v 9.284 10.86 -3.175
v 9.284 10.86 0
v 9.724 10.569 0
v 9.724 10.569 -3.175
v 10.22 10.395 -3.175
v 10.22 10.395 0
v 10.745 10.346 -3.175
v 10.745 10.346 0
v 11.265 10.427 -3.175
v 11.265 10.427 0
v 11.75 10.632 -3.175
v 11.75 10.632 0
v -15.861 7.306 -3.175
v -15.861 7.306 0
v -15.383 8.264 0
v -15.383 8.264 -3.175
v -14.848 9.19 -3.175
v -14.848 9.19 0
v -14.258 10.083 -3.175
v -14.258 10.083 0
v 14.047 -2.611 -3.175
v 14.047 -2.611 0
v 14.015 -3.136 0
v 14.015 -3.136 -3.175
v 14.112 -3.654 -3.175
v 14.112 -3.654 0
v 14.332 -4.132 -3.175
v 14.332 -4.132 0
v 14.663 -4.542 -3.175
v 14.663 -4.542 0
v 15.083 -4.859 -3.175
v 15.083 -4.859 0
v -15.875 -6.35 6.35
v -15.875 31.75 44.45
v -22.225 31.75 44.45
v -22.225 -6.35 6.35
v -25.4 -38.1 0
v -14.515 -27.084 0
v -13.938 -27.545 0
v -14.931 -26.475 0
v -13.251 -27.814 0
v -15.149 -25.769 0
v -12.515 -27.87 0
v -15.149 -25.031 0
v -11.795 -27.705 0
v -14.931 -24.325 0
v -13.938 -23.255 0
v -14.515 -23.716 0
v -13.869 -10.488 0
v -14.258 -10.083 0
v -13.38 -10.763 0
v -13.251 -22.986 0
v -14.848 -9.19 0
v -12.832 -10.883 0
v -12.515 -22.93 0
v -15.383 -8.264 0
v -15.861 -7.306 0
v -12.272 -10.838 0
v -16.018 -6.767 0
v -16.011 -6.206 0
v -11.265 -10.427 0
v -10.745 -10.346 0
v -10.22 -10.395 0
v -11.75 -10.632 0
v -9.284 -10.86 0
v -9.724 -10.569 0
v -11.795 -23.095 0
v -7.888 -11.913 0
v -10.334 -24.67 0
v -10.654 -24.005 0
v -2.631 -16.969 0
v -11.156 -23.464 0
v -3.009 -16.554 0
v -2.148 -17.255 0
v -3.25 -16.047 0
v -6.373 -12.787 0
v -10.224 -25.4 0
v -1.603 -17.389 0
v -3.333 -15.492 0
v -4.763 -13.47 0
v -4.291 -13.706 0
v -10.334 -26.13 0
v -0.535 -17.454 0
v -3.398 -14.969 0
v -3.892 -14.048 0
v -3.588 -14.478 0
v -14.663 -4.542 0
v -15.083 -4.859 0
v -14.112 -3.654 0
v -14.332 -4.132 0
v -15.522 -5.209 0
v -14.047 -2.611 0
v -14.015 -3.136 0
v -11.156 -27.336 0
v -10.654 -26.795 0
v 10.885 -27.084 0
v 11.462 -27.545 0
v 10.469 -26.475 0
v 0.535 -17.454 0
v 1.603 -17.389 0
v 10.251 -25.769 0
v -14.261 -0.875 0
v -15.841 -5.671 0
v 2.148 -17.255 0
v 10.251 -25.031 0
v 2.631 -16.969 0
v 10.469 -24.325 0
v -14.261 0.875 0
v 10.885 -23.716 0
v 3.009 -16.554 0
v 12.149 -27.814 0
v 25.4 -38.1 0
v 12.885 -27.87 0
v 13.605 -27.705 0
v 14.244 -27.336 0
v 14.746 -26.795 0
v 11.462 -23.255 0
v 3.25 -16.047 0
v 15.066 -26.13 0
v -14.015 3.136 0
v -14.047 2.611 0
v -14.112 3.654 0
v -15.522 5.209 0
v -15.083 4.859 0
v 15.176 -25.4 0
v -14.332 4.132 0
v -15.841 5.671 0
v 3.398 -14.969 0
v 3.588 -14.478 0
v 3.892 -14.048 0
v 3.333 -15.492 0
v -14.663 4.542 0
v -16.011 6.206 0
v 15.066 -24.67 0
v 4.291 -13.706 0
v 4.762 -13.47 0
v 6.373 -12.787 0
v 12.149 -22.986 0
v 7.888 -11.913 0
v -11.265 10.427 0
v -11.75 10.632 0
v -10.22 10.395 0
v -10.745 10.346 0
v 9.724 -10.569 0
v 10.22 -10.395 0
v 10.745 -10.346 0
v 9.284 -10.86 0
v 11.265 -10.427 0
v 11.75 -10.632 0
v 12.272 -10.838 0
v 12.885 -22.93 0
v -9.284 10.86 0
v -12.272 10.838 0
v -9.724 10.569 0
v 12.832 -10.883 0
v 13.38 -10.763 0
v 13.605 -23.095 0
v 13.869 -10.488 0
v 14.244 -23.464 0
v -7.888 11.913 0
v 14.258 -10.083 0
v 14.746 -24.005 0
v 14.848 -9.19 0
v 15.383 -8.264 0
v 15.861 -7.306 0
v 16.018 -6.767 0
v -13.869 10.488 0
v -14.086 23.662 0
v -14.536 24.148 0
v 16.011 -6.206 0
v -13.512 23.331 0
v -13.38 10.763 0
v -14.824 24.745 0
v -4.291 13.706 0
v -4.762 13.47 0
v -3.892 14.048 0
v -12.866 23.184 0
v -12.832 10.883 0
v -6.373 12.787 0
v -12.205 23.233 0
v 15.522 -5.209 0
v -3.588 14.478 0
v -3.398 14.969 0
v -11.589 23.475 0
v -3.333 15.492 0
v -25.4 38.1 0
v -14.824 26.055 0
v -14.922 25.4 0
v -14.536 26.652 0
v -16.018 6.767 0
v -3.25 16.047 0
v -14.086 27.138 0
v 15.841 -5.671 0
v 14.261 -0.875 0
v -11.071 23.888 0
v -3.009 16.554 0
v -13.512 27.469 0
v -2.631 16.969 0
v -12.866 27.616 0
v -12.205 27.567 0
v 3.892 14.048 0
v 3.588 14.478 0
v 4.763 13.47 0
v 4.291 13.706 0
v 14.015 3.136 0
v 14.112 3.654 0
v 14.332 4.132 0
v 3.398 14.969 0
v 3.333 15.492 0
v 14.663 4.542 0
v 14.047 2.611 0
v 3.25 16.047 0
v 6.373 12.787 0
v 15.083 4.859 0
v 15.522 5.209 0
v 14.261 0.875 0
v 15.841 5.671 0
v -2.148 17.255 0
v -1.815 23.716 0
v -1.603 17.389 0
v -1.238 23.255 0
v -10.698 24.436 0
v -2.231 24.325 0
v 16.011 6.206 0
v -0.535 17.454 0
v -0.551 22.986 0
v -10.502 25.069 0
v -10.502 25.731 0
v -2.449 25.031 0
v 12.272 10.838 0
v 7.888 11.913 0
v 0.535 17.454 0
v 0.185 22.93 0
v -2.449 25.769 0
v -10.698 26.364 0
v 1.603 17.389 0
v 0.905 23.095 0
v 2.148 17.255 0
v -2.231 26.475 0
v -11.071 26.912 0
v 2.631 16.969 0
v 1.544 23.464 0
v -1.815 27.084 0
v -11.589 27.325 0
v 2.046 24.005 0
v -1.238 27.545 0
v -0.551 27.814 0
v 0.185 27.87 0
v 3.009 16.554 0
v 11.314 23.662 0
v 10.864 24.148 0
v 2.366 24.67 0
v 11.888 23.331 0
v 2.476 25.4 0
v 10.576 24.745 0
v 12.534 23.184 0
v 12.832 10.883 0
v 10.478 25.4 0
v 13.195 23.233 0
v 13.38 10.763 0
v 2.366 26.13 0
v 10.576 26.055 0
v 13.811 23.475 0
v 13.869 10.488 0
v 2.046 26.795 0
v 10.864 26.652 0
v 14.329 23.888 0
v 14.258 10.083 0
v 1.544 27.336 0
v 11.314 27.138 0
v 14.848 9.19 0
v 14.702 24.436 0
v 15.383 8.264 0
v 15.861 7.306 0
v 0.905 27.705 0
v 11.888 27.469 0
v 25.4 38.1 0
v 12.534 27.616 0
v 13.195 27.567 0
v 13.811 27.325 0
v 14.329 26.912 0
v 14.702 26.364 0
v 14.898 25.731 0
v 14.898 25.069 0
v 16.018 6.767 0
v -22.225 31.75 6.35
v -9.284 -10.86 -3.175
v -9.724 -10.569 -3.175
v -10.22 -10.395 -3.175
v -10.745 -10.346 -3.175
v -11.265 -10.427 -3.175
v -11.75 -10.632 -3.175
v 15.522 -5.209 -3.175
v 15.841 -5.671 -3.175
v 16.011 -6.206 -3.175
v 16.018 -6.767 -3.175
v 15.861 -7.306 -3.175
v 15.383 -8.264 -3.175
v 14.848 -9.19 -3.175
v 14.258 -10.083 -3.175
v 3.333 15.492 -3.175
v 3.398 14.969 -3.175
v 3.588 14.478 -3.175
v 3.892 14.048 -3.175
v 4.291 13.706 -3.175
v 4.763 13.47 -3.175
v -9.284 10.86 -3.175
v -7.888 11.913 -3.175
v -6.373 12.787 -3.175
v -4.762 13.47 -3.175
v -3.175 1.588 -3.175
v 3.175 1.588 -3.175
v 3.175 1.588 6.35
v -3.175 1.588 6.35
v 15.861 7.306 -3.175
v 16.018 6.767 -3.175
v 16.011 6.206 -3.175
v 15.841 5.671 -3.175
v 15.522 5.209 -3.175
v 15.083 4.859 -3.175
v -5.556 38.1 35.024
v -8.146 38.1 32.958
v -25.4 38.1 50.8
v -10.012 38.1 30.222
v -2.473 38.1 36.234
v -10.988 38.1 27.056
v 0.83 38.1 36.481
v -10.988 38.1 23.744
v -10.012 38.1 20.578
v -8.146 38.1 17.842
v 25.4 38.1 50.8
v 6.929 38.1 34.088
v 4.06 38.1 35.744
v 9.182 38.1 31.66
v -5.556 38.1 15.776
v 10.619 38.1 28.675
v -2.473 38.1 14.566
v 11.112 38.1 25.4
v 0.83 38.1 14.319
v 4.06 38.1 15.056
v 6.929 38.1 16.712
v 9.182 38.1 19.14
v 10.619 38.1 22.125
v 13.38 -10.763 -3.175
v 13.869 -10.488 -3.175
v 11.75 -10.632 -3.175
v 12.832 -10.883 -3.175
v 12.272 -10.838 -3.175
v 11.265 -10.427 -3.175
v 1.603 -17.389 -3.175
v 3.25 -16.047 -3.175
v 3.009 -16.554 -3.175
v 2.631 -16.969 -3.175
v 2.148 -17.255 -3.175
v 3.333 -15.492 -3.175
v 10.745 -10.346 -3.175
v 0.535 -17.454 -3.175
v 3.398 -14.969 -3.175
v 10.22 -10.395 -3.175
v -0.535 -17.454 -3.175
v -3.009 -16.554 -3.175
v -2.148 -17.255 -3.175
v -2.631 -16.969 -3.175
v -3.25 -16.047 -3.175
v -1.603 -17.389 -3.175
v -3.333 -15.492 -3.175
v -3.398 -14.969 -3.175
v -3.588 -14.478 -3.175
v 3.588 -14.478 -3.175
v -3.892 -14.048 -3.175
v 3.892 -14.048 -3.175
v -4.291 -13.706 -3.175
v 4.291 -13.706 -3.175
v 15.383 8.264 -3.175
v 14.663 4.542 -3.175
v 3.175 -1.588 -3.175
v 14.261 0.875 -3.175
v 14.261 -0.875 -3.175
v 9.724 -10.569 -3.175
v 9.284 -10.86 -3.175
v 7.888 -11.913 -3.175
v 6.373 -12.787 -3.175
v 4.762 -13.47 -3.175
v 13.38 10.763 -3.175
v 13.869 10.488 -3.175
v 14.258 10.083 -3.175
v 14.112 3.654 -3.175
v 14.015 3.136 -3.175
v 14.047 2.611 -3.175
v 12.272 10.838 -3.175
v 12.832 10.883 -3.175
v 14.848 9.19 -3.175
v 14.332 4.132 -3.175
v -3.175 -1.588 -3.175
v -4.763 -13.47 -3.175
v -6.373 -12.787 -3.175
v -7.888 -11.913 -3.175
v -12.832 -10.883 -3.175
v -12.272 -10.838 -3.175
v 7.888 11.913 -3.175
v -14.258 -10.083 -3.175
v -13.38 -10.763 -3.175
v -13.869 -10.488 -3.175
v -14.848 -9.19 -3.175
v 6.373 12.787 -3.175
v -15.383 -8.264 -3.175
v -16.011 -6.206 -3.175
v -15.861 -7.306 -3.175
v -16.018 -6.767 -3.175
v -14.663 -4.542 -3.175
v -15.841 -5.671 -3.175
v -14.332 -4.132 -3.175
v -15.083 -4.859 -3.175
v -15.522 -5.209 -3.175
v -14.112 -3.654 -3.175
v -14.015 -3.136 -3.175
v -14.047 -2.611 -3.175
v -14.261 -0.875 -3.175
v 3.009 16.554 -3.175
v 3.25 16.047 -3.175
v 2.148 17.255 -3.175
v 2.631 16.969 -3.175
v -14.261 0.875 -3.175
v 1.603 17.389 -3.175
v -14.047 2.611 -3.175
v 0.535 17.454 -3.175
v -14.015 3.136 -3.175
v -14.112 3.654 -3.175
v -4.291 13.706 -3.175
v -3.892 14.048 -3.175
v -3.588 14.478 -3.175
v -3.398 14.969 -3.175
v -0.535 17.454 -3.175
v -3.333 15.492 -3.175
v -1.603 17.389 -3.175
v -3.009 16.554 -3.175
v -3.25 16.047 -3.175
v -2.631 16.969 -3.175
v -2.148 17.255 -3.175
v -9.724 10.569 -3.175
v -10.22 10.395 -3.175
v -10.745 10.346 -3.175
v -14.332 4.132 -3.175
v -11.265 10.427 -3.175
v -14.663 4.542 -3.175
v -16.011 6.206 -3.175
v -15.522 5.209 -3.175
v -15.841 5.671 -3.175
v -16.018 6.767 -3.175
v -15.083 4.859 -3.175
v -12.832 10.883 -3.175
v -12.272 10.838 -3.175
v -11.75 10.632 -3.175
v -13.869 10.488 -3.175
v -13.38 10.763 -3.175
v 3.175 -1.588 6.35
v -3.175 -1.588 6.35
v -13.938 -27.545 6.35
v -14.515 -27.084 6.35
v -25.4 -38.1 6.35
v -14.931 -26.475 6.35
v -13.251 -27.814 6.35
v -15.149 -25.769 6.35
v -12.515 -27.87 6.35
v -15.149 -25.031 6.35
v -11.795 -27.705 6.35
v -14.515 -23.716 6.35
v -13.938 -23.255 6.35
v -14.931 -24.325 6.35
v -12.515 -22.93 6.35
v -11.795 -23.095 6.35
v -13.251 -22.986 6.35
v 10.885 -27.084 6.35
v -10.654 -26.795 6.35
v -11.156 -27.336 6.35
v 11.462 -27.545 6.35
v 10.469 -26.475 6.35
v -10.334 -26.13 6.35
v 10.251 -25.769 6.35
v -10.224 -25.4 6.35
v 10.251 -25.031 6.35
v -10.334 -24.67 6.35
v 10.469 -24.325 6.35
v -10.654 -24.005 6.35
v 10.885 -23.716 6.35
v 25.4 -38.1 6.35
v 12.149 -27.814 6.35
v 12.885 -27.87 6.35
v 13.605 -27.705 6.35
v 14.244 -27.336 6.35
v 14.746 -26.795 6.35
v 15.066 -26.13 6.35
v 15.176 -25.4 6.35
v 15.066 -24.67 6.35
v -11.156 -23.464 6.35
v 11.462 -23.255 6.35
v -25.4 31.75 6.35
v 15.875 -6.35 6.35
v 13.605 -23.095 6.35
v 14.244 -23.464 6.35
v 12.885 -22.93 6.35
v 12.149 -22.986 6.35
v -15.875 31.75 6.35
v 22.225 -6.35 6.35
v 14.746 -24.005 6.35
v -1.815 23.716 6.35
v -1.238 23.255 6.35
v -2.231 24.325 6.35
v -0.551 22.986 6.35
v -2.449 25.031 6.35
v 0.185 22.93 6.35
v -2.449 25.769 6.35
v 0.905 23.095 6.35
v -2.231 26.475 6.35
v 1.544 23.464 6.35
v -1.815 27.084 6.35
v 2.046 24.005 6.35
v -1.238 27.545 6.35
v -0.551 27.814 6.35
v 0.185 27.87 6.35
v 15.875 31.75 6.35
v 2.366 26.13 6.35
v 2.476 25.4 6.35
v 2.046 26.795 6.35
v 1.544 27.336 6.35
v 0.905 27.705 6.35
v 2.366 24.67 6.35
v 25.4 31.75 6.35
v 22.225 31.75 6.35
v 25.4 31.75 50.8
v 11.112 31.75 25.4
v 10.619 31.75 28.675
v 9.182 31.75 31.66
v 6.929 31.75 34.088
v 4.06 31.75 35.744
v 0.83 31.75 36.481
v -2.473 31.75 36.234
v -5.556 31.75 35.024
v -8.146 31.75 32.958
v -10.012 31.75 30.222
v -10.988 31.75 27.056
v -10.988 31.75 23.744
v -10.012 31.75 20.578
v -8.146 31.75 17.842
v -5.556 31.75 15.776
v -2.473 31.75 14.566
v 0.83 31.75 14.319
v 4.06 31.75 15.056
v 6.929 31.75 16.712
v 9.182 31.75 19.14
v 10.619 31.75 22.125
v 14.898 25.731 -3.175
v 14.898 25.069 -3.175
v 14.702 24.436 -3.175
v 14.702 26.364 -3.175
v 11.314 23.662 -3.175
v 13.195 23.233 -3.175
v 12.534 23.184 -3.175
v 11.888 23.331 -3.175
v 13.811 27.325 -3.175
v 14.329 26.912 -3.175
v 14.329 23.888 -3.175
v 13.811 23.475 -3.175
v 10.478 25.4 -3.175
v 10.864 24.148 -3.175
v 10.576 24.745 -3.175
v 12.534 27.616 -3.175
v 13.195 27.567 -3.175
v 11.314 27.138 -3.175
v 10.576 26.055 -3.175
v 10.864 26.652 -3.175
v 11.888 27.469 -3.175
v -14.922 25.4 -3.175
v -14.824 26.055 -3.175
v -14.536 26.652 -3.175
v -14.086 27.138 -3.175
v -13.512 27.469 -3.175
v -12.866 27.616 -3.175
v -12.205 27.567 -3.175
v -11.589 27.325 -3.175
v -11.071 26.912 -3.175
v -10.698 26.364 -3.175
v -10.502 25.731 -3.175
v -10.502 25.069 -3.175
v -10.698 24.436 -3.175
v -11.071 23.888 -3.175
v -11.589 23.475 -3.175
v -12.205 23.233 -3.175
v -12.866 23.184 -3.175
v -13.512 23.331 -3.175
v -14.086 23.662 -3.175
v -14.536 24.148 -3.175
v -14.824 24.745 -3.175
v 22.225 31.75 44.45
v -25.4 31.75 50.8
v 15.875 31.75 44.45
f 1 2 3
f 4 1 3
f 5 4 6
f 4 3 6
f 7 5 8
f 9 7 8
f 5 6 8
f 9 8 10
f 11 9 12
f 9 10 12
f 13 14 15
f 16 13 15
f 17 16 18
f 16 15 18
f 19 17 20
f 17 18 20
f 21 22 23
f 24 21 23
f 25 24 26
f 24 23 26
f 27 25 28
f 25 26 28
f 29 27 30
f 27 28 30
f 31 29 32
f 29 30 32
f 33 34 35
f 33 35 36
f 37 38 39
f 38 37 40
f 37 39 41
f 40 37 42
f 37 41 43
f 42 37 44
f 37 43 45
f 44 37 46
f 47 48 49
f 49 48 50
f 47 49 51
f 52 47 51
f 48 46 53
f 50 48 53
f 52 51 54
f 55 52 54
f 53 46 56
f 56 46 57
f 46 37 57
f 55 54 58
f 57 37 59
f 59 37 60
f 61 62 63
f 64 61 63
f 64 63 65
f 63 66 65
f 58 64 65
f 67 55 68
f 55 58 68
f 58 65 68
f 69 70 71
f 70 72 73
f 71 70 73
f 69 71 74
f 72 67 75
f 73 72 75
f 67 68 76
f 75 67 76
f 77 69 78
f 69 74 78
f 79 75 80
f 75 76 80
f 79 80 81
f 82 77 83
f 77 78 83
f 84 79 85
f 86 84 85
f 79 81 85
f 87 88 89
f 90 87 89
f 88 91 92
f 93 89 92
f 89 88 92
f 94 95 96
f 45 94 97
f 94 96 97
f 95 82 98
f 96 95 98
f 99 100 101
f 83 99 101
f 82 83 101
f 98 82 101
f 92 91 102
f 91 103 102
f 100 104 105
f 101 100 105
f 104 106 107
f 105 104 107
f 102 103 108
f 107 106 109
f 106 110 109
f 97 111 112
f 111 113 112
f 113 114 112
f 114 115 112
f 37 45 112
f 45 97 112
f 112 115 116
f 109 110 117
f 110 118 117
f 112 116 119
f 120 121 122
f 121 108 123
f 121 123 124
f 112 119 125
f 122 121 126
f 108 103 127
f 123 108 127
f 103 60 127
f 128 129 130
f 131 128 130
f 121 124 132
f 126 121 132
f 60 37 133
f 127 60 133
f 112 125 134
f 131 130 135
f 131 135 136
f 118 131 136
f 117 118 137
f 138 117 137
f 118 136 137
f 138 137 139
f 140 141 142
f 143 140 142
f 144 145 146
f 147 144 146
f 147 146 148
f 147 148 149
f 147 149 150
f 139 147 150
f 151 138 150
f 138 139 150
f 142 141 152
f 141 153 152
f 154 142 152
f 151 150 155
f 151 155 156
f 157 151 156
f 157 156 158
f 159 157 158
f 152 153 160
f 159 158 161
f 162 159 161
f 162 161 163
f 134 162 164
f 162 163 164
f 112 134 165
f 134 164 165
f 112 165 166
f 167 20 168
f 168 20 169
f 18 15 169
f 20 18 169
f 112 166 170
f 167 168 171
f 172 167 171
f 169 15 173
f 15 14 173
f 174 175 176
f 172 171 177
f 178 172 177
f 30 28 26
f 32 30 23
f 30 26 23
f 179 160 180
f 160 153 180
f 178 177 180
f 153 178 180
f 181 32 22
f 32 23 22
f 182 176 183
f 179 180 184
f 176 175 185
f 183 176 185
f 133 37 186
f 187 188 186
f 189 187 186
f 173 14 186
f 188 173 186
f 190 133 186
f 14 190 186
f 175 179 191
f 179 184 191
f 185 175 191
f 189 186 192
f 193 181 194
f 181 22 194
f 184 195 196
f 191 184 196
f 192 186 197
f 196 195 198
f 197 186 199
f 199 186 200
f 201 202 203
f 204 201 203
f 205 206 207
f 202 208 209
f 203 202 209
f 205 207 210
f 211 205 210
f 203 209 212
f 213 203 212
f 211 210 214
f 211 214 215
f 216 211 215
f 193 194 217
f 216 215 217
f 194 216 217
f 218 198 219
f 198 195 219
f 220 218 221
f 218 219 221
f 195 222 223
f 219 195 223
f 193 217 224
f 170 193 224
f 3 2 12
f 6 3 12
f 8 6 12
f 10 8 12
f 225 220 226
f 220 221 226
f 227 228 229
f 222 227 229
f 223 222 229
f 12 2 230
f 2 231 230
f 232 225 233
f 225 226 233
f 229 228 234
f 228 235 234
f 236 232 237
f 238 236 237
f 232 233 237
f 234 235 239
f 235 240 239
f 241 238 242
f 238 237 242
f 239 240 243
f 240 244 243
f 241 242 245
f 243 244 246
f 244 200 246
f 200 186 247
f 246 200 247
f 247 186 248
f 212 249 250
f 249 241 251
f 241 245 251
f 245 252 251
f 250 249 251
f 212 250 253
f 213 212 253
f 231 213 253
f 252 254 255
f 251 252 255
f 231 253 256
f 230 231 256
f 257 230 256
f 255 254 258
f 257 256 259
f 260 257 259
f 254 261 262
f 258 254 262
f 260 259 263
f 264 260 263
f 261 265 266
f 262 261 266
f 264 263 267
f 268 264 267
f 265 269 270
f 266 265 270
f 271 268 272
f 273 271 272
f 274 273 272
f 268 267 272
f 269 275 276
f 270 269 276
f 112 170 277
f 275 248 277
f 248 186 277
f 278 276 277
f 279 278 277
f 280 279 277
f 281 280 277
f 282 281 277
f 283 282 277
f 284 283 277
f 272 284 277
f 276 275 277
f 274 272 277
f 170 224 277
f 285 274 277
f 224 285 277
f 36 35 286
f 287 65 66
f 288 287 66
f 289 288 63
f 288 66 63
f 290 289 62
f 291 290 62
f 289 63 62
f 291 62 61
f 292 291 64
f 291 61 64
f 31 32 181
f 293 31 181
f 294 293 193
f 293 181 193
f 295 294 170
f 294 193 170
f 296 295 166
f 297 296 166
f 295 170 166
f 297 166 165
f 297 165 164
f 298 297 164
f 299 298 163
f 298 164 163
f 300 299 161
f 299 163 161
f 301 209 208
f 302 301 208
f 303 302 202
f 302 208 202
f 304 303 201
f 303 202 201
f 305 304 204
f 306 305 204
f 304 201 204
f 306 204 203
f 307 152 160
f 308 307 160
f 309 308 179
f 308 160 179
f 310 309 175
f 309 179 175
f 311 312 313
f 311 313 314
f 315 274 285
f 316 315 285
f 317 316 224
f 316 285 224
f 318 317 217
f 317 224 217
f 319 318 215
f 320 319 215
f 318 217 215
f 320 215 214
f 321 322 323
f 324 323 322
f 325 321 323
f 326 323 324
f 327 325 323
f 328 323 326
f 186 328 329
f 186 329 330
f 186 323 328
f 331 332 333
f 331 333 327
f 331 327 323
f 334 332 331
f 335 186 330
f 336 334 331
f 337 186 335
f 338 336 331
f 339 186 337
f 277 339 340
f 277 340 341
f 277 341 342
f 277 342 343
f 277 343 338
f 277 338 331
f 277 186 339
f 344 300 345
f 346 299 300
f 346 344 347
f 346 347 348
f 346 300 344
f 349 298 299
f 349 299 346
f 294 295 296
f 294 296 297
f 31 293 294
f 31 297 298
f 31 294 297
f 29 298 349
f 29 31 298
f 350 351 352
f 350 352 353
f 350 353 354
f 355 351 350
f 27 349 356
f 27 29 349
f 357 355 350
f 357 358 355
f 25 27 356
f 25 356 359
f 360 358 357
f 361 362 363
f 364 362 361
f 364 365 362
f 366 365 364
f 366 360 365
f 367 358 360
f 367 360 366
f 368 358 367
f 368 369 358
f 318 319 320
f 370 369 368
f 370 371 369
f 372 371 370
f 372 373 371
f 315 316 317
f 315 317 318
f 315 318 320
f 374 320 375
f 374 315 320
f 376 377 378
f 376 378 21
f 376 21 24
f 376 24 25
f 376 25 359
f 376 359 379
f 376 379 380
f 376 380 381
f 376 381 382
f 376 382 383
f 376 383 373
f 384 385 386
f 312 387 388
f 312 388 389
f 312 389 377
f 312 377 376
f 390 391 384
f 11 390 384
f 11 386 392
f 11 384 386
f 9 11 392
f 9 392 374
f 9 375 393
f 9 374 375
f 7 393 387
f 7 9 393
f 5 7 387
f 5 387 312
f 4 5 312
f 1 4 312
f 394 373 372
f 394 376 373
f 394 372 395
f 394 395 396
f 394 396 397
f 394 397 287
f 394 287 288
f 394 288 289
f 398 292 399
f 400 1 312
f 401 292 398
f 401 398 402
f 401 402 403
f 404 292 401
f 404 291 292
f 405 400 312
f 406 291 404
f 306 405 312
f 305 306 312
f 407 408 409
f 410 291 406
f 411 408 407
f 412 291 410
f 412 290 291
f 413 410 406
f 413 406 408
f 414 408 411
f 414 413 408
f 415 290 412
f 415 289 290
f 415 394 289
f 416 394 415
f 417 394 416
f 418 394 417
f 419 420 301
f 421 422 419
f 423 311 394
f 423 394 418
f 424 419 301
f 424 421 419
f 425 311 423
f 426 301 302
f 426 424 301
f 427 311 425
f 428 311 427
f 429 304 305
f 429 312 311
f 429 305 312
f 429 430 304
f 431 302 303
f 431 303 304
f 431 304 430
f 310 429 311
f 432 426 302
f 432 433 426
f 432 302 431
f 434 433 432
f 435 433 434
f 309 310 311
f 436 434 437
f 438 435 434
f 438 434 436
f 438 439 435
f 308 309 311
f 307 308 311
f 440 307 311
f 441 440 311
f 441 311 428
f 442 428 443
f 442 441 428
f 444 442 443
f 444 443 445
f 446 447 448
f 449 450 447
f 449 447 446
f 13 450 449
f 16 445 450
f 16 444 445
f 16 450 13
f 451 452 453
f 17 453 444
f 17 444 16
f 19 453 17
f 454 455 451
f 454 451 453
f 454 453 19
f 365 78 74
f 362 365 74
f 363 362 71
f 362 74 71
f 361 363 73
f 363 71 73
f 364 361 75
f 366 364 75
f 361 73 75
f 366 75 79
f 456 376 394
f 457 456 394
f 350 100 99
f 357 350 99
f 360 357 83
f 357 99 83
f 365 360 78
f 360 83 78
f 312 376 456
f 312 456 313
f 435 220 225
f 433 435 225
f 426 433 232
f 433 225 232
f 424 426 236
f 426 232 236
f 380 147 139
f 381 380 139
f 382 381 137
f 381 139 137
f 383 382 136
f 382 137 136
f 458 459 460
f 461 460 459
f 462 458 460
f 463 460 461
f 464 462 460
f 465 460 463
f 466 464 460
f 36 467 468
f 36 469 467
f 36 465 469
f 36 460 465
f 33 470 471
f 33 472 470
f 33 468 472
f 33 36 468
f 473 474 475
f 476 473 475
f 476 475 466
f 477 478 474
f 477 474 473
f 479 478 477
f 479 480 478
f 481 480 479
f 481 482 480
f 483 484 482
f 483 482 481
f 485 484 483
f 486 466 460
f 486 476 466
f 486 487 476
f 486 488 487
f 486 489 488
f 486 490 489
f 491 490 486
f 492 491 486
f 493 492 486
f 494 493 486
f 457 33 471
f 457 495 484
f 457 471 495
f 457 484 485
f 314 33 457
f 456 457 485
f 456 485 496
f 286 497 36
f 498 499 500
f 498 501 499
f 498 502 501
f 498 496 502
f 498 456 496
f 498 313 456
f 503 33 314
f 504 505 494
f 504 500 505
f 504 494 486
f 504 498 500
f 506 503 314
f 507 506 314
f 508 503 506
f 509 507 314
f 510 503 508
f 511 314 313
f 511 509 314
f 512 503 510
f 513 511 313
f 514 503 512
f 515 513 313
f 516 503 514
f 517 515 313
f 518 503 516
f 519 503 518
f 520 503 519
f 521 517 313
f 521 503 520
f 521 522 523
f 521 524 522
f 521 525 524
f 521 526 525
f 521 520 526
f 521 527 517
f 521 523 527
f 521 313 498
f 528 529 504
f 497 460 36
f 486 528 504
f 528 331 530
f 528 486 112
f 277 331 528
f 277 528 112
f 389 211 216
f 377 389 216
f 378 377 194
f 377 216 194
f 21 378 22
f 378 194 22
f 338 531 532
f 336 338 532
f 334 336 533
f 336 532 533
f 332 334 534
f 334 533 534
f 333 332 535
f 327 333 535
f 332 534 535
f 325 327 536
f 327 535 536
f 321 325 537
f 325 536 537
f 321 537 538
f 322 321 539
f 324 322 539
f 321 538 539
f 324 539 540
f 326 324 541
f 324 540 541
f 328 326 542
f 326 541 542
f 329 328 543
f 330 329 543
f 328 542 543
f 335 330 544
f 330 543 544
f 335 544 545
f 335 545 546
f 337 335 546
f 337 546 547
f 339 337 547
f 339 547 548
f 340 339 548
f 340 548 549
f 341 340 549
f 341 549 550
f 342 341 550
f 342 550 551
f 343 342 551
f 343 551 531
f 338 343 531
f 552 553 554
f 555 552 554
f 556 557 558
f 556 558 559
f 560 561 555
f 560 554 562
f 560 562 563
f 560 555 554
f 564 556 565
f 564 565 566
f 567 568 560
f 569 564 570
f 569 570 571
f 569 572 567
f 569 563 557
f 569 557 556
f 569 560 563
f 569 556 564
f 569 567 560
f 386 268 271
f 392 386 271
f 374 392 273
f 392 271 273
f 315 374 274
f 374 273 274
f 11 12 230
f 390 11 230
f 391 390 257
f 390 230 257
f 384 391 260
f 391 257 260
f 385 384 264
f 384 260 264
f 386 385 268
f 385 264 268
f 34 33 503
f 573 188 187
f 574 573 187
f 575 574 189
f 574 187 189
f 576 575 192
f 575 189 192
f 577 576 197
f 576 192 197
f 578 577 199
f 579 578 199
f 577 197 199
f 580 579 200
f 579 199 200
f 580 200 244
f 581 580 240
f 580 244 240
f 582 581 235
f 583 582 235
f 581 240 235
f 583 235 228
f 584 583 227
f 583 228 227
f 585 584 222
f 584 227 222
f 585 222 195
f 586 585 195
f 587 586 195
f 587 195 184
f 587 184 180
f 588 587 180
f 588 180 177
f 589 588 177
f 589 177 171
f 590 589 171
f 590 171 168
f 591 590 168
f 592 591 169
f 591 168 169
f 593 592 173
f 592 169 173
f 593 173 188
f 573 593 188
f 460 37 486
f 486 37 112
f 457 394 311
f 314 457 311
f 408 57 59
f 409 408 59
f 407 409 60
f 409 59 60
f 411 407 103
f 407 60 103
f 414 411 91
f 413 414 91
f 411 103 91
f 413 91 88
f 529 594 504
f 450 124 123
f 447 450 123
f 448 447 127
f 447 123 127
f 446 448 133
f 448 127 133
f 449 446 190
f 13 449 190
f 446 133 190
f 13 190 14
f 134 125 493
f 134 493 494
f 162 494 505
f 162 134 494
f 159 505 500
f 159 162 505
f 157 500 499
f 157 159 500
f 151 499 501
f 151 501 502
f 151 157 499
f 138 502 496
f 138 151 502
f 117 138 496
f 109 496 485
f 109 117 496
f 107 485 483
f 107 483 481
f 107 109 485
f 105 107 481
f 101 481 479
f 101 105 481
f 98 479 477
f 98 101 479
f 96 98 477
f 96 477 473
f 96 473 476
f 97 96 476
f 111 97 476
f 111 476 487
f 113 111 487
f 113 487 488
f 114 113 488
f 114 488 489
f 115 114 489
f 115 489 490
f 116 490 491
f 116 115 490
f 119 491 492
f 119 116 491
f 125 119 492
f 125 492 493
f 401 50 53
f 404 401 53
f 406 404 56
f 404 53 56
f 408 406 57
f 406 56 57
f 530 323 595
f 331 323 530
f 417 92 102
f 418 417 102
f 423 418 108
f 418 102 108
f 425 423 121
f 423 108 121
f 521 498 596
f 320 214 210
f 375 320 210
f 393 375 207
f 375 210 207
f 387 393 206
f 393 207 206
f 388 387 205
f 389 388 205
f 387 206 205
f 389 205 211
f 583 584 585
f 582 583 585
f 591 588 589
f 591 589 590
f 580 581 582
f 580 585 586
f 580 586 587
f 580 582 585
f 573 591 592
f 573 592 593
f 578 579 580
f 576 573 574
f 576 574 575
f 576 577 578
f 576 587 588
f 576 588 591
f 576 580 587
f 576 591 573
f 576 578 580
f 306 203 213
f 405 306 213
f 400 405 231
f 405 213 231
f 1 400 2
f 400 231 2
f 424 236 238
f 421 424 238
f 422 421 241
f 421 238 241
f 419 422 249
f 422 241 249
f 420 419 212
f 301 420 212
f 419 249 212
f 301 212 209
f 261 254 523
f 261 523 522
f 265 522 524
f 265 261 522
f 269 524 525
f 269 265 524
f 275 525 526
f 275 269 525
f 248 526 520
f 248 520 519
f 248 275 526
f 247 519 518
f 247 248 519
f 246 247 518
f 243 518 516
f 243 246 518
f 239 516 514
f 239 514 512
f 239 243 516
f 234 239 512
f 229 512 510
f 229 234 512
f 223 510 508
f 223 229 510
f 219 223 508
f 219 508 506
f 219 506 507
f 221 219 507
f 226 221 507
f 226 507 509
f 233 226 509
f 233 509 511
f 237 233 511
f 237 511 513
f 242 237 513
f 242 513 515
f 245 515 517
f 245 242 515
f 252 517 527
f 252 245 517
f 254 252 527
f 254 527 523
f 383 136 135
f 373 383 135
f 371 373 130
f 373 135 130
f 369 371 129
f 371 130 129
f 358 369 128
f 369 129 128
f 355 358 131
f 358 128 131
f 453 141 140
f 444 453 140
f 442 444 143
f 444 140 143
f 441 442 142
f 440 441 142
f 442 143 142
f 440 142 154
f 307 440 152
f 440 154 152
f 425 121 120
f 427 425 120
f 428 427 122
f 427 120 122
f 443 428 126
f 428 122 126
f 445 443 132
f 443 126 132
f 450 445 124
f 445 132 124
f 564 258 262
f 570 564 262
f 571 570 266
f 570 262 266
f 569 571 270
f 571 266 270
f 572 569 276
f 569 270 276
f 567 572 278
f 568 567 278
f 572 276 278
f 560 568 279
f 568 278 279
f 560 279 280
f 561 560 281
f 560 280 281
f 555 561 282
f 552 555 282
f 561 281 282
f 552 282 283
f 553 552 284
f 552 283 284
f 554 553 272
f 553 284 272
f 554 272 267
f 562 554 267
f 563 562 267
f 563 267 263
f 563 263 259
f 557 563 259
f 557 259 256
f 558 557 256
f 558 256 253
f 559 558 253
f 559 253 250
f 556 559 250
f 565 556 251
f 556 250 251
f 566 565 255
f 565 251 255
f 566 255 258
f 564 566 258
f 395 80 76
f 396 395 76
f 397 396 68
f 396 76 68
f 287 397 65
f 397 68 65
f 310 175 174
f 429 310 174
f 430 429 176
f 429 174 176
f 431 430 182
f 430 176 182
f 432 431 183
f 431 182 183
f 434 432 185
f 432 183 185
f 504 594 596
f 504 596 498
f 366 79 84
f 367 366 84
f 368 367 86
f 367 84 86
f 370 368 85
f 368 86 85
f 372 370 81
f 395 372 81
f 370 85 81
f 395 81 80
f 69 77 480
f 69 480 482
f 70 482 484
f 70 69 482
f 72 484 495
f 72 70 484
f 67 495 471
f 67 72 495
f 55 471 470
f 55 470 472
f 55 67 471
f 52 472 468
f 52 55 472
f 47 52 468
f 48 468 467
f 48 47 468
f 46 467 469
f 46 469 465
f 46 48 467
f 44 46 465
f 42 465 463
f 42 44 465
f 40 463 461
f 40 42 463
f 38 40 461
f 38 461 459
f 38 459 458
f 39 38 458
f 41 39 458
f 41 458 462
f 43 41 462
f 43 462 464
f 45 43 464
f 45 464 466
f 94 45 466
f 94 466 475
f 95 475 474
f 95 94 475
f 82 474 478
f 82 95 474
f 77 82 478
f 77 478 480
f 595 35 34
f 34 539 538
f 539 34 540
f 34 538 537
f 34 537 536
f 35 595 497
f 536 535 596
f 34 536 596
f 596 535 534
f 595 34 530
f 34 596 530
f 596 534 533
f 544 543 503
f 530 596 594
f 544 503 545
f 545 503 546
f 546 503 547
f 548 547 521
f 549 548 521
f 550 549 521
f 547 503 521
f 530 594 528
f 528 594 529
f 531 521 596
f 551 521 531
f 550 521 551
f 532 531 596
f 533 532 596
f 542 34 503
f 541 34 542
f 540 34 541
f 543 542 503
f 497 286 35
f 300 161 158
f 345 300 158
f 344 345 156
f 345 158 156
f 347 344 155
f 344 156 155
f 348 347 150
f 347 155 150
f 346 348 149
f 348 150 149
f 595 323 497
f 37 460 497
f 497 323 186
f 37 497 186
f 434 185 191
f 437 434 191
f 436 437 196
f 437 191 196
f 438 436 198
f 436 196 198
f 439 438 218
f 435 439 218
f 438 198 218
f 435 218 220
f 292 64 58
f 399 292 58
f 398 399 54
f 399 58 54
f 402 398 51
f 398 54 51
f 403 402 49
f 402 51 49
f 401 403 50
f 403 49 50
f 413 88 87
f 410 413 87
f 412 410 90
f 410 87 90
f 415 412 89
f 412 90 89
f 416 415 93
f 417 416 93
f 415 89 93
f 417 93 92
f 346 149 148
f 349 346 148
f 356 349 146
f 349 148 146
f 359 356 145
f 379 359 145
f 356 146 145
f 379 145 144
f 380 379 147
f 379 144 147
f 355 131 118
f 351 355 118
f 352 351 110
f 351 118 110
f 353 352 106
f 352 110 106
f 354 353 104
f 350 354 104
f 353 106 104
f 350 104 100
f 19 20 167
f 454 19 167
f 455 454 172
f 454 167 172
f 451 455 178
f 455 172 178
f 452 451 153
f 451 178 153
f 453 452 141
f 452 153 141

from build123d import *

# Parameters (mm, degrees)
SKETCH1_W           = 50.8
SKETCH1_H           = 76.2
SKETCH1_R           = 2.4765
BOSS_EXTRUDE1_DEPTH = 6.35
SKETCH2_R           = 2.2225
BOSS_EXTRUDE2_DEPTH = 3.175
SKETCH3_W           = 6.35
SKETCH3_H           = 3.175
CUT_EXTRUDE1_DEPTH  = 10.525
SKETCH4_W           = 50.8
SKETCH4_H           = 44.45
BOSS_EXTRUDE3_DEPTH = 6.35
BOSS_EXTRUDE4_DEPTH = 22.225
SKETCH6_W           = 31.75
SKETCH6_H           = 38.1
CUT_EXTRUDE2_DEPTH  = 45.45
SKETCH7_R           = 11.1125
CUT_EXTRUDE3_DEPTH  = 7.35


with BuildPart() as part:
    # Sketch1 → Boss-Extrude1 (new body)
    with BuildSketch(Plane.XY):
        Rectangle(SKETCH1_W, SKETCH1_H)
        with Locations((-12.7, -25.4)):
            Circle(SKETCH1_R, mode=Mode.SUBTRACT)
        with Locations((12.7, -25.4)):
            Circle(SKETCH1_R, mode=Mode.SUBTRACT)
        with Locations((0, 25.4)):
            Circle(SKETCH1_R, mode=Mode.SUBTRACT)
    extrude(amount=BOSS_EXTRUDE1_DEPTH)

    # Sketch2 → Boss-Extrude2 (add)
    with BuildSketch(Plane(origin=(0, 0, 0), x_dir=(-1, 0, 0), z_dir=(0, 0, -1))):
        with Locations((-12.7, 25.4)):
            Circle(SKETCH2_R)
        with Locations((12.7, 25.4)):
            Circle(SKETCH2_R)
        with BuildLine():
            ThreePointArc((-4.7625, 13.470384182), (-7.14375, 12.373337957), (-9.2844449, 10.859638076))
            ThreePointArc((-9.2844449, 10.859638076), (-10.480991316, 10.354281134), (-11.74973534, 10.632485314))
            ThreePointArc((-11.74973534, 10.632485314), (-13.110218123, 10.843506493), (-14.257611096, 10.082630217))
            ThreePointArc((-14.257611096, 10.082630217), (-15.122968614, 8.73125), (-15.860619453, 7.306138298))
            ThreePointArc((-15.860619453, 7.306138298), (-15.94586115, 5.932028698), (-15.082870058, 4.859326635))
            ThreePointArc((-15.082870058, 4.859326635), (-14.207566158, 3.899664169), (-14.0469449, 2.610746105))
            ThreePointArc((-14.0469449, 2.610746105), (-14.2875, 0), (-14.0469449, -2.610746105))
            ThreePointArc((-14.0469449, -2.610746105), (-14.207566158, -3.899664169), (-15.082870058, -4.859326635))
            ThreePointArc((-15.082870058, -4.859326635), (-15.94586115, -5.932028698), (-15.860619453, -7.306138298))
            ThreePointArc((-15.860619453, -7.306138298), (-15.122968614, -8.73125), (-14.257611096, -10.082630217))
            ThreePointArc((-14.257611096, -10.082630217), (-13.110218123, -10.843506493), (-11.74973534, -10.632485314))
            ThreePointArc((-11.74973534, -10.632485314), (-10.480991316, -10.354281134), (-9.2844449, -10.859638076))
            ThreePointArc((-9.2844449, -10.859638076), (-7.14375, -12.373337957), (-4.7625, -13.470384182))
            ThreePointArc((-4.7625, -13.470384182), (-3.726574842, -14.253945304), (-3.333134718, -15.491811949))
            ThreePointArc((-3.333134718, -15.491811949), (-2.835643027, -16.77553519), (-1.603008357, -17.388768515))
            ThreePointArc((-1.603008357, -17.388768515), (0, -17.4625), (1.603008357, -17.388768515))
            ThreePointArc((1.603008357, -17.388768515), (2.835643027, -16.77553519), (3.333134718, -15.491811949))
            ThreePointArc((3.333134718, -15.491811949), (3.726574842, -14.253945304), (4.7625, -13.470384182))
            ThreePointArc((4.7625, -13.470384182), (7.14375, -12.373337957), (9.2844449, -10.859638076))
            ThreePointArc((9.2844449, -10.859638076), (10.480991316, -10.354281134), (11.74973534, -10.632485314))
            ThreePointArc((11.74973534, -10.632485314), (13.110218123, -10.843506493), (14.257611096, -10.082630217))
            ThreePointArc((14.257611096, -10.082630217), (15.122968614, -8.73125), (15.860619453, -7.306138298))
            ThreePointArc((15.860619453, -7.306138298), (15.94586115, -5.932028698), (15.082870058, -4.859326635))
            ThreePointArc((15.082870058, -4.859326635), (14.207566158, -3.899664169), (14.0469449, -2.610746105))
            ThreePointArc((14.0469449, -2.610746105), (14.2875, 0), (14.0469449, 2.610746105))
            ThreePointArc((14.0469449, 2.610746105), (14.207566158, 3.899664169), (15.082870058, 4.859326635))
            ThreePointArc((15.082870058, 4.859326635), (15.94586115, 5.932028698), (15.860619453, 7.306138298))
            ThreePointArc((15.860619453, 7.306138298), (15.122968614, 8.73125), (14.257611096, 10.082630217))
            ThreePointArc((14.257611096, 10.082630217), (13.110218123, 10.843506493), (11.74973534, 10.632485314))
            ThreePointArc((11.74973534, 10.632485314), (10.480991316, 10.354281134), (9.2844449, 10.859638076))
            ThreePointArc((9.2844449, 10.859638076), (7.14375, 12.373337957), (4.7625, 13.470384182))
            ThreePointArc((4.7625, 13.470384182), (3.726574842, 14.253945304), (3.333134718, 15.491811949))
            ThreePointArc((3.333134718, 15.491811949), (2.835643027, 16.77553519), (1.603008357, 17.388768515))
            ThreePointArc((1.603008357, 17.388768515), (0, 17.4625), (-1.603008357, 17.388768515))
            ThreePointArc((-1.603008357, 17.388768515), (-2.835643027, 16.77553519), (-3.333134718, 15.491811949))
            ThreePointArc((-3.333134718, 15.491811949), (-3.726574842, 14.253945304), (-4.7625, 13.470384182))
        make_face()
    extrude(amount=BOSS_EXTRUDE2_DEPTH)

    # Sketch3 → Cut-Extrude1 (cut, through all)
    with BuildSketch(Plane(origin=(0, 0, -3.175), x_dir=(-1, 0, 0), z_dir=(0, 0, -1))):
        Rectangle(SKETCH3_W, SKETCH3_H)
    extrude(amount=-CUT_EXTRUDE1_DEPTH, mode=Mode.SUBTRACT)

    # Sketch4 → Boss-Extrude3 (add)
    with BuildSketch(Plane(origin=(0, 38.1, 0), x_dir=(1, 0, 0), z_dir=(0, 1, 0))):
        with Locations((0, -28.575)):
            Rectangle(SKETCH4_W, SKETCH4_H)
    extrude(amount=-BOSS_EXTRUDE3_DEPTH)

    # Sketch5 → Boss-Extrude4 (add, symmetric)
    with BuildSketch(Plane(origin=(0, 0, 0), x_dir=(0, 0, -1), z_dir=(1, 0, 0))):
        Polygon((-44.45, 31.75), (-6.35, -6.35), (-6.35, 31.75), align=None)
    extrude(amount=BOSS_EXTRUDE4_DEPTH, both=True)

    # Sketch6 → Cut-Extrude2 (cut, through all)
    with BuildSketch(Plane.XY.offset(6.35)):
        with Locations((0, 12.7)):
            Rectangle(SKETCH6_W, SKETCH6_H)
    extrude(amount=CUT_EXTRUDE2_DEPTH, mode=Mode.SUBTRACT)

    # Sketch7 → Cut-Extrude3 (cut, through all)
    with BuildSketch(Plane.XZ.offset(-31.75)):
        with Locations((0, 25.4)):
            Circle(SKETCH7_R)
    extrude(amount=-CUT_EXTRUDE3_DEPTH, mode=Mode.SUBTRACT)


solid = part.part
